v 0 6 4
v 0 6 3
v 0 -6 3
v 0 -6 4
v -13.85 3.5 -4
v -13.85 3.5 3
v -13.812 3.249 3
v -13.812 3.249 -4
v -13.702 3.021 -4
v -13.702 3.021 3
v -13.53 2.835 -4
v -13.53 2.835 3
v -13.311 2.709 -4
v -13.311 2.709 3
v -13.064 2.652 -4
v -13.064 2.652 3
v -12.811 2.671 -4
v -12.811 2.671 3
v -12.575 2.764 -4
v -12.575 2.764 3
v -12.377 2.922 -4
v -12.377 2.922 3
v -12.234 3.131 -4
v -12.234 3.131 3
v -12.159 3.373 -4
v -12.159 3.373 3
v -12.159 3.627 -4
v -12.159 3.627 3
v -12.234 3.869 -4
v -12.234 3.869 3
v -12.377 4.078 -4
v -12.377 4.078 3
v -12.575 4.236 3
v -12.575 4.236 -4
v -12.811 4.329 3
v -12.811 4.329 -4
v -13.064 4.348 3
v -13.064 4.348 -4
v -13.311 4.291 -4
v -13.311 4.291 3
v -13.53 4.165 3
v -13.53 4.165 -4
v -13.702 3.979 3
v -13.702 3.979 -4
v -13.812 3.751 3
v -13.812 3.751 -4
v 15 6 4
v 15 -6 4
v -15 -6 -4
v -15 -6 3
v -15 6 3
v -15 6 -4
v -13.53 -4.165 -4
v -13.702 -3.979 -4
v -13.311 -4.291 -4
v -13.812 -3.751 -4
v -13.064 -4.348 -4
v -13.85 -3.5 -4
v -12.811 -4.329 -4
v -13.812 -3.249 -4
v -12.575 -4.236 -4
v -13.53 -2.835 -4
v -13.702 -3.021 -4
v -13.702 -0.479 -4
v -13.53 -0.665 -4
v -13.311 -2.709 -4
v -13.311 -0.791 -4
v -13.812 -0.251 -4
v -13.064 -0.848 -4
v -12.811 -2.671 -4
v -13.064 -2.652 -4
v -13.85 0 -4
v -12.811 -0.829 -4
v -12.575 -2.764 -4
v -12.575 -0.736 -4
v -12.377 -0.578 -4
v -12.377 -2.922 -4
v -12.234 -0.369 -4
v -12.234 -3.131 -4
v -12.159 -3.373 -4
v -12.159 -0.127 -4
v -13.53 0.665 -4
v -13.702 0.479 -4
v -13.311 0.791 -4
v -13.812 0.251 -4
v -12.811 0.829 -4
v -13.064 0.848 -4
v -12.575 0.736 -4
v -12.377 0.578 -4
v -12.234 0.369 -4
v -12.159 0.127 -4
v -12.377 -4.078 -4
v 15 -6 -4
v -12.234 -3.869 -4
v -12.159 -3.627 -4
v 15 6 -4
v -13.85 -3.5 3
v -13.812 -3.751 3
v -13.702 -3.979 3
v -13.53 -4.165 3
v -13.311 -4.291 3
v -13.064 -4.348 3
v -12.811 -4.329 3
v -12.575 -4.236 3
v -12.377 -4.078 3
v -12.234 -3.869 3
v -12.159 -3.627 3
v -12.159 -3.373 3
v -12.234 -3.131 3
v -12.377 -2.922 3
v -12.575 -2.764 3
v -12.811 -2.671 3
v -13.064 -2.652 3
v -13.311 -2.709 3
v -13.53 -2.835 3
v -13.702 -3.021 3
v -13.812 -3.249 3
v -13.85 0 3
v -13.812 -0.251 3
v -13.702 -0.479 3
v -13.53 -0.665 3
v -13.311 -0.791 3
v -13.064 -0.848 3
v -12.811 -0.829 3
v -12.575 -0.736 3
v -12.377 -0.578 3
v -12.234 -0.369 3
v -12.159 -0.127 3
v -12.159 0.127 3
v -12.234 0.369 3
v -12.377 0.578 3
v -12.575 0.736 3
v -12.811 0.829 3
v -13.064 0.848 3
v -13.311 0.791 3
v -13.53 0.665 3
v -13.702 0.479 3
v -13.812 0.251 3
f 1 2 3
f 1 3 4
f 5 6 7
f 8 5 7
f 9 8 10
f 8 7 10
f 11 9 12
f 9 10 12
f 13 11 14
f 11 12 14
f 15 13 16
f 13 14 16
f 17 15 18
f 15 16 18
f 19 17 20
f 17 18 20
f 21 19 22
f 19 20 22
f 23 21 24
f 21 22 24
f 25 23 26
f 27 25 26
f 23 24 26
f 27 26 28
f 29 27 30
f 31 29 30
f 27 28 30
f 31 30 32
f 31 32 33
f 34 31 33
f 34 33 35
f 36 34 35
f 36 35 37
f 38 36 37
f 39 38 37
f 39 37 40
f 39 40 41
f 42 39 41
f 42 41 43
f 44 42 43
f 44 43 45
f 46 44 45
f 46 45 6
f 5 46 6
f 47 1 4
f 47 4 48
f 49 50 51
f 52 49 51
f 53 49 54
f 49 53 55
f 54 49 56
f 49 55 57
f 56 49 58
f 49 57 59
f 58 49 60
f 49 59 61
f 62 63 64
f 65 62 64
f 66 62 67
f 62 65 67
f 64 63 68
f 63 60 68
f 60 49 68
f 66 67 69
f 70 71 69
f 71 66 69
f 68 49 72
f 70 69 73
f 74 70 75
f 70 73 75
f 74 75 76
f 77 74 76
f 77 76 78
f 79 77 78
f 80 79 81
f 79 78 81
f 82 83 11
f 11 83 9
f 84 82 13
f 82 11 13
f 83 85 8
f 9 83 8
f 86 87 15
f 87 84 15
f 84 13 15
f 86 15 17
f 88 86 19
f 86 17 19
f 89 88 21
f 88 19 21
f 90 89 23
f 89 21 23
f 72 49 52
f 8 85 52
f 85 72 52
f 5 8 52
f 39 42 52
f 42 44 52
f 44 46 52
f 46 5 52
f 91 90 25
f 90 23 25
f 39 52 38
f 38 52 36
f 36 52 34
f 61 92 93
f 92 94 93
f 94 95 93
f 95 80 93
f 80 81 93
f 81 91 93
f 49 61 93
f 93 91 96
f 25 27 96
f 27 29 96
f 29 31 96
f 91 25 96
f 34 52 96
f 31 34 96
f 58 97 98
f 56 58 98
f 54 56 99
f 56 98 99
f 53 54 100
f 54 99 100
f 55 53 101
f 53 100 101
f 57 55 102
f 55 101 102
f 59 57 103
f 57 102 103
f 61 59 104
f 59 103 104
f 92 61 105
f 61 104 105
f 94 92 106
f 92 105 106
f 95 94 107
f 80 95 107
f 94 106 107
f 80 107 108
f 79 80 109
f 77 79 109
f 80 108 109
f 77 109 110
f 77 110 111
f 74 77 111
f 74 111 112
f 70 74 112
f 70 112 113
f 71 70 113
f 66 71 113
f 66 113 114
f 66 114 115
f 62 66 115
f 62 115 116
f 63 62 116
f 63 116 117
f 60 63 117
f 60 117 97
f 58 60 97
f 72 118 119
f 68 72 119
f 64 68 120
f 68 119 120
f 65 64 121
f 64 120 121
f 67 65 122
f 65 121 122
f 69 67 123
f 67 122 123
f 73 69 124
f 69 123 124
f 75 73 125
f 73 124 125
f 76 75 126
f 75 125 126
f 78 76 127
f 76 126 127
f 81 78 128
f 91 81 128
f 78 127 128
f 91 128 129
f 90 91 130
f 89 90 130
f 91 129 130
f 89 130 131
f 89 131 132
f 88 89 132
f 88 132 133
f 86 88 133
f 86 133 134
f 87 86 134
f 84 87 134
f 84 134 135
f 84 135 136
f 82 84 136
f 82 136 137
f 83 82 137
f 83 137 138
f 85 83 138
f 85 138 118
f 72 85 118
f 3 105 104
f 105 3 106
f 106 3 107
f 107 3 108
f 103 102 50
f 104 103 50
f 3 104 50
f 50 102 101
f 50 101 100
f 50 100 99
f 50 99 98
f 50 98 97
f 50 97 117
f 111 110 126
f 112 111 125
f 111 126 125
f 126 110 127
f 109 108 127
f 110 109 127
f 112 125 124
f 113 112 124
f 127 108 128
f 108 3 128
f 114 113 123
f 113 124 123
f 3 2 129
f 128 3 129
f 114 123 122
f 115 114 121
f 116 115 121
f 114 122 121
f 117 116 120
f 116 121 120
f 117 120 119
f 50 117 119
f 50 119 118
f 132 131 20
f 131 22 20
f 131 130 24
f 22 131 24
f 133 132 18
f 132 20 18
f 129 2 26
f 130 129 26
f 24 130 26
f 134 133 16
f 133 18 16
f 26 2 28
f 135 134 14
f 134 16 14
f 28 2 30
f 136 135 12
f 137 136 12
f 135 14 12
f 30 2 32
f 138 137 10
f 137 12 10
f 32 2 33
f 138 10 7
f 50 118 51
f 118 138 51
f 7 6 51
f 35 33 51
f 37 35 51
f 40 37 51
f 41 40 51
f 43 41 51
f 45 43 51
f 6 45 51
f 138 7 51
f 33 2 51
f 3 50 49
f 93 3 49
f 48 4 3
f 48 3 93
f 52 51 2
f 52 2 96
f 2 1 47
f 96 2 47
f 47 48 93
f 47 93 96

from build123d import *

# Parameters (mm, degrees)
F0_W     = 30
F0_H     = 12
F1_DEPTH = 4
F2_W     = 15
F2_H     = 1
F3_DEPTH = 25
F5_D     = 1.7


with BuildPart() as f1:
    # F0 (on Top) → F1 (new body, symmetric)
    with BuildSketch(Plane.XY):
        Rectangle(F0_W, F0_H)
    extrude(amount=F1_DEPTH, both=True)

    # F2 (on face) → F3 (cut)
    with BuildSketch(Plane(origin=(0, 6, 0), x_dir=(-1, 0, 0), z_dir=(0, 1, 0))):
        with Locations((7.5, 3.5)):
            Rectangle(F2_W, F2_H)
    extrude(amount=-F3_DEPTH, mode=Mode.SUBTRACT)

    # F5 (through all)
    with Locations(Plane(origin=(0, 0, -4), x_dir=(1, 0, 0), z_dir=(0, 0, -1))):
        with Locations((-13, -3.5), (-13, 0), (-13, 3.5)):
            Hole(F5_D / 2)


solid = f1.part
